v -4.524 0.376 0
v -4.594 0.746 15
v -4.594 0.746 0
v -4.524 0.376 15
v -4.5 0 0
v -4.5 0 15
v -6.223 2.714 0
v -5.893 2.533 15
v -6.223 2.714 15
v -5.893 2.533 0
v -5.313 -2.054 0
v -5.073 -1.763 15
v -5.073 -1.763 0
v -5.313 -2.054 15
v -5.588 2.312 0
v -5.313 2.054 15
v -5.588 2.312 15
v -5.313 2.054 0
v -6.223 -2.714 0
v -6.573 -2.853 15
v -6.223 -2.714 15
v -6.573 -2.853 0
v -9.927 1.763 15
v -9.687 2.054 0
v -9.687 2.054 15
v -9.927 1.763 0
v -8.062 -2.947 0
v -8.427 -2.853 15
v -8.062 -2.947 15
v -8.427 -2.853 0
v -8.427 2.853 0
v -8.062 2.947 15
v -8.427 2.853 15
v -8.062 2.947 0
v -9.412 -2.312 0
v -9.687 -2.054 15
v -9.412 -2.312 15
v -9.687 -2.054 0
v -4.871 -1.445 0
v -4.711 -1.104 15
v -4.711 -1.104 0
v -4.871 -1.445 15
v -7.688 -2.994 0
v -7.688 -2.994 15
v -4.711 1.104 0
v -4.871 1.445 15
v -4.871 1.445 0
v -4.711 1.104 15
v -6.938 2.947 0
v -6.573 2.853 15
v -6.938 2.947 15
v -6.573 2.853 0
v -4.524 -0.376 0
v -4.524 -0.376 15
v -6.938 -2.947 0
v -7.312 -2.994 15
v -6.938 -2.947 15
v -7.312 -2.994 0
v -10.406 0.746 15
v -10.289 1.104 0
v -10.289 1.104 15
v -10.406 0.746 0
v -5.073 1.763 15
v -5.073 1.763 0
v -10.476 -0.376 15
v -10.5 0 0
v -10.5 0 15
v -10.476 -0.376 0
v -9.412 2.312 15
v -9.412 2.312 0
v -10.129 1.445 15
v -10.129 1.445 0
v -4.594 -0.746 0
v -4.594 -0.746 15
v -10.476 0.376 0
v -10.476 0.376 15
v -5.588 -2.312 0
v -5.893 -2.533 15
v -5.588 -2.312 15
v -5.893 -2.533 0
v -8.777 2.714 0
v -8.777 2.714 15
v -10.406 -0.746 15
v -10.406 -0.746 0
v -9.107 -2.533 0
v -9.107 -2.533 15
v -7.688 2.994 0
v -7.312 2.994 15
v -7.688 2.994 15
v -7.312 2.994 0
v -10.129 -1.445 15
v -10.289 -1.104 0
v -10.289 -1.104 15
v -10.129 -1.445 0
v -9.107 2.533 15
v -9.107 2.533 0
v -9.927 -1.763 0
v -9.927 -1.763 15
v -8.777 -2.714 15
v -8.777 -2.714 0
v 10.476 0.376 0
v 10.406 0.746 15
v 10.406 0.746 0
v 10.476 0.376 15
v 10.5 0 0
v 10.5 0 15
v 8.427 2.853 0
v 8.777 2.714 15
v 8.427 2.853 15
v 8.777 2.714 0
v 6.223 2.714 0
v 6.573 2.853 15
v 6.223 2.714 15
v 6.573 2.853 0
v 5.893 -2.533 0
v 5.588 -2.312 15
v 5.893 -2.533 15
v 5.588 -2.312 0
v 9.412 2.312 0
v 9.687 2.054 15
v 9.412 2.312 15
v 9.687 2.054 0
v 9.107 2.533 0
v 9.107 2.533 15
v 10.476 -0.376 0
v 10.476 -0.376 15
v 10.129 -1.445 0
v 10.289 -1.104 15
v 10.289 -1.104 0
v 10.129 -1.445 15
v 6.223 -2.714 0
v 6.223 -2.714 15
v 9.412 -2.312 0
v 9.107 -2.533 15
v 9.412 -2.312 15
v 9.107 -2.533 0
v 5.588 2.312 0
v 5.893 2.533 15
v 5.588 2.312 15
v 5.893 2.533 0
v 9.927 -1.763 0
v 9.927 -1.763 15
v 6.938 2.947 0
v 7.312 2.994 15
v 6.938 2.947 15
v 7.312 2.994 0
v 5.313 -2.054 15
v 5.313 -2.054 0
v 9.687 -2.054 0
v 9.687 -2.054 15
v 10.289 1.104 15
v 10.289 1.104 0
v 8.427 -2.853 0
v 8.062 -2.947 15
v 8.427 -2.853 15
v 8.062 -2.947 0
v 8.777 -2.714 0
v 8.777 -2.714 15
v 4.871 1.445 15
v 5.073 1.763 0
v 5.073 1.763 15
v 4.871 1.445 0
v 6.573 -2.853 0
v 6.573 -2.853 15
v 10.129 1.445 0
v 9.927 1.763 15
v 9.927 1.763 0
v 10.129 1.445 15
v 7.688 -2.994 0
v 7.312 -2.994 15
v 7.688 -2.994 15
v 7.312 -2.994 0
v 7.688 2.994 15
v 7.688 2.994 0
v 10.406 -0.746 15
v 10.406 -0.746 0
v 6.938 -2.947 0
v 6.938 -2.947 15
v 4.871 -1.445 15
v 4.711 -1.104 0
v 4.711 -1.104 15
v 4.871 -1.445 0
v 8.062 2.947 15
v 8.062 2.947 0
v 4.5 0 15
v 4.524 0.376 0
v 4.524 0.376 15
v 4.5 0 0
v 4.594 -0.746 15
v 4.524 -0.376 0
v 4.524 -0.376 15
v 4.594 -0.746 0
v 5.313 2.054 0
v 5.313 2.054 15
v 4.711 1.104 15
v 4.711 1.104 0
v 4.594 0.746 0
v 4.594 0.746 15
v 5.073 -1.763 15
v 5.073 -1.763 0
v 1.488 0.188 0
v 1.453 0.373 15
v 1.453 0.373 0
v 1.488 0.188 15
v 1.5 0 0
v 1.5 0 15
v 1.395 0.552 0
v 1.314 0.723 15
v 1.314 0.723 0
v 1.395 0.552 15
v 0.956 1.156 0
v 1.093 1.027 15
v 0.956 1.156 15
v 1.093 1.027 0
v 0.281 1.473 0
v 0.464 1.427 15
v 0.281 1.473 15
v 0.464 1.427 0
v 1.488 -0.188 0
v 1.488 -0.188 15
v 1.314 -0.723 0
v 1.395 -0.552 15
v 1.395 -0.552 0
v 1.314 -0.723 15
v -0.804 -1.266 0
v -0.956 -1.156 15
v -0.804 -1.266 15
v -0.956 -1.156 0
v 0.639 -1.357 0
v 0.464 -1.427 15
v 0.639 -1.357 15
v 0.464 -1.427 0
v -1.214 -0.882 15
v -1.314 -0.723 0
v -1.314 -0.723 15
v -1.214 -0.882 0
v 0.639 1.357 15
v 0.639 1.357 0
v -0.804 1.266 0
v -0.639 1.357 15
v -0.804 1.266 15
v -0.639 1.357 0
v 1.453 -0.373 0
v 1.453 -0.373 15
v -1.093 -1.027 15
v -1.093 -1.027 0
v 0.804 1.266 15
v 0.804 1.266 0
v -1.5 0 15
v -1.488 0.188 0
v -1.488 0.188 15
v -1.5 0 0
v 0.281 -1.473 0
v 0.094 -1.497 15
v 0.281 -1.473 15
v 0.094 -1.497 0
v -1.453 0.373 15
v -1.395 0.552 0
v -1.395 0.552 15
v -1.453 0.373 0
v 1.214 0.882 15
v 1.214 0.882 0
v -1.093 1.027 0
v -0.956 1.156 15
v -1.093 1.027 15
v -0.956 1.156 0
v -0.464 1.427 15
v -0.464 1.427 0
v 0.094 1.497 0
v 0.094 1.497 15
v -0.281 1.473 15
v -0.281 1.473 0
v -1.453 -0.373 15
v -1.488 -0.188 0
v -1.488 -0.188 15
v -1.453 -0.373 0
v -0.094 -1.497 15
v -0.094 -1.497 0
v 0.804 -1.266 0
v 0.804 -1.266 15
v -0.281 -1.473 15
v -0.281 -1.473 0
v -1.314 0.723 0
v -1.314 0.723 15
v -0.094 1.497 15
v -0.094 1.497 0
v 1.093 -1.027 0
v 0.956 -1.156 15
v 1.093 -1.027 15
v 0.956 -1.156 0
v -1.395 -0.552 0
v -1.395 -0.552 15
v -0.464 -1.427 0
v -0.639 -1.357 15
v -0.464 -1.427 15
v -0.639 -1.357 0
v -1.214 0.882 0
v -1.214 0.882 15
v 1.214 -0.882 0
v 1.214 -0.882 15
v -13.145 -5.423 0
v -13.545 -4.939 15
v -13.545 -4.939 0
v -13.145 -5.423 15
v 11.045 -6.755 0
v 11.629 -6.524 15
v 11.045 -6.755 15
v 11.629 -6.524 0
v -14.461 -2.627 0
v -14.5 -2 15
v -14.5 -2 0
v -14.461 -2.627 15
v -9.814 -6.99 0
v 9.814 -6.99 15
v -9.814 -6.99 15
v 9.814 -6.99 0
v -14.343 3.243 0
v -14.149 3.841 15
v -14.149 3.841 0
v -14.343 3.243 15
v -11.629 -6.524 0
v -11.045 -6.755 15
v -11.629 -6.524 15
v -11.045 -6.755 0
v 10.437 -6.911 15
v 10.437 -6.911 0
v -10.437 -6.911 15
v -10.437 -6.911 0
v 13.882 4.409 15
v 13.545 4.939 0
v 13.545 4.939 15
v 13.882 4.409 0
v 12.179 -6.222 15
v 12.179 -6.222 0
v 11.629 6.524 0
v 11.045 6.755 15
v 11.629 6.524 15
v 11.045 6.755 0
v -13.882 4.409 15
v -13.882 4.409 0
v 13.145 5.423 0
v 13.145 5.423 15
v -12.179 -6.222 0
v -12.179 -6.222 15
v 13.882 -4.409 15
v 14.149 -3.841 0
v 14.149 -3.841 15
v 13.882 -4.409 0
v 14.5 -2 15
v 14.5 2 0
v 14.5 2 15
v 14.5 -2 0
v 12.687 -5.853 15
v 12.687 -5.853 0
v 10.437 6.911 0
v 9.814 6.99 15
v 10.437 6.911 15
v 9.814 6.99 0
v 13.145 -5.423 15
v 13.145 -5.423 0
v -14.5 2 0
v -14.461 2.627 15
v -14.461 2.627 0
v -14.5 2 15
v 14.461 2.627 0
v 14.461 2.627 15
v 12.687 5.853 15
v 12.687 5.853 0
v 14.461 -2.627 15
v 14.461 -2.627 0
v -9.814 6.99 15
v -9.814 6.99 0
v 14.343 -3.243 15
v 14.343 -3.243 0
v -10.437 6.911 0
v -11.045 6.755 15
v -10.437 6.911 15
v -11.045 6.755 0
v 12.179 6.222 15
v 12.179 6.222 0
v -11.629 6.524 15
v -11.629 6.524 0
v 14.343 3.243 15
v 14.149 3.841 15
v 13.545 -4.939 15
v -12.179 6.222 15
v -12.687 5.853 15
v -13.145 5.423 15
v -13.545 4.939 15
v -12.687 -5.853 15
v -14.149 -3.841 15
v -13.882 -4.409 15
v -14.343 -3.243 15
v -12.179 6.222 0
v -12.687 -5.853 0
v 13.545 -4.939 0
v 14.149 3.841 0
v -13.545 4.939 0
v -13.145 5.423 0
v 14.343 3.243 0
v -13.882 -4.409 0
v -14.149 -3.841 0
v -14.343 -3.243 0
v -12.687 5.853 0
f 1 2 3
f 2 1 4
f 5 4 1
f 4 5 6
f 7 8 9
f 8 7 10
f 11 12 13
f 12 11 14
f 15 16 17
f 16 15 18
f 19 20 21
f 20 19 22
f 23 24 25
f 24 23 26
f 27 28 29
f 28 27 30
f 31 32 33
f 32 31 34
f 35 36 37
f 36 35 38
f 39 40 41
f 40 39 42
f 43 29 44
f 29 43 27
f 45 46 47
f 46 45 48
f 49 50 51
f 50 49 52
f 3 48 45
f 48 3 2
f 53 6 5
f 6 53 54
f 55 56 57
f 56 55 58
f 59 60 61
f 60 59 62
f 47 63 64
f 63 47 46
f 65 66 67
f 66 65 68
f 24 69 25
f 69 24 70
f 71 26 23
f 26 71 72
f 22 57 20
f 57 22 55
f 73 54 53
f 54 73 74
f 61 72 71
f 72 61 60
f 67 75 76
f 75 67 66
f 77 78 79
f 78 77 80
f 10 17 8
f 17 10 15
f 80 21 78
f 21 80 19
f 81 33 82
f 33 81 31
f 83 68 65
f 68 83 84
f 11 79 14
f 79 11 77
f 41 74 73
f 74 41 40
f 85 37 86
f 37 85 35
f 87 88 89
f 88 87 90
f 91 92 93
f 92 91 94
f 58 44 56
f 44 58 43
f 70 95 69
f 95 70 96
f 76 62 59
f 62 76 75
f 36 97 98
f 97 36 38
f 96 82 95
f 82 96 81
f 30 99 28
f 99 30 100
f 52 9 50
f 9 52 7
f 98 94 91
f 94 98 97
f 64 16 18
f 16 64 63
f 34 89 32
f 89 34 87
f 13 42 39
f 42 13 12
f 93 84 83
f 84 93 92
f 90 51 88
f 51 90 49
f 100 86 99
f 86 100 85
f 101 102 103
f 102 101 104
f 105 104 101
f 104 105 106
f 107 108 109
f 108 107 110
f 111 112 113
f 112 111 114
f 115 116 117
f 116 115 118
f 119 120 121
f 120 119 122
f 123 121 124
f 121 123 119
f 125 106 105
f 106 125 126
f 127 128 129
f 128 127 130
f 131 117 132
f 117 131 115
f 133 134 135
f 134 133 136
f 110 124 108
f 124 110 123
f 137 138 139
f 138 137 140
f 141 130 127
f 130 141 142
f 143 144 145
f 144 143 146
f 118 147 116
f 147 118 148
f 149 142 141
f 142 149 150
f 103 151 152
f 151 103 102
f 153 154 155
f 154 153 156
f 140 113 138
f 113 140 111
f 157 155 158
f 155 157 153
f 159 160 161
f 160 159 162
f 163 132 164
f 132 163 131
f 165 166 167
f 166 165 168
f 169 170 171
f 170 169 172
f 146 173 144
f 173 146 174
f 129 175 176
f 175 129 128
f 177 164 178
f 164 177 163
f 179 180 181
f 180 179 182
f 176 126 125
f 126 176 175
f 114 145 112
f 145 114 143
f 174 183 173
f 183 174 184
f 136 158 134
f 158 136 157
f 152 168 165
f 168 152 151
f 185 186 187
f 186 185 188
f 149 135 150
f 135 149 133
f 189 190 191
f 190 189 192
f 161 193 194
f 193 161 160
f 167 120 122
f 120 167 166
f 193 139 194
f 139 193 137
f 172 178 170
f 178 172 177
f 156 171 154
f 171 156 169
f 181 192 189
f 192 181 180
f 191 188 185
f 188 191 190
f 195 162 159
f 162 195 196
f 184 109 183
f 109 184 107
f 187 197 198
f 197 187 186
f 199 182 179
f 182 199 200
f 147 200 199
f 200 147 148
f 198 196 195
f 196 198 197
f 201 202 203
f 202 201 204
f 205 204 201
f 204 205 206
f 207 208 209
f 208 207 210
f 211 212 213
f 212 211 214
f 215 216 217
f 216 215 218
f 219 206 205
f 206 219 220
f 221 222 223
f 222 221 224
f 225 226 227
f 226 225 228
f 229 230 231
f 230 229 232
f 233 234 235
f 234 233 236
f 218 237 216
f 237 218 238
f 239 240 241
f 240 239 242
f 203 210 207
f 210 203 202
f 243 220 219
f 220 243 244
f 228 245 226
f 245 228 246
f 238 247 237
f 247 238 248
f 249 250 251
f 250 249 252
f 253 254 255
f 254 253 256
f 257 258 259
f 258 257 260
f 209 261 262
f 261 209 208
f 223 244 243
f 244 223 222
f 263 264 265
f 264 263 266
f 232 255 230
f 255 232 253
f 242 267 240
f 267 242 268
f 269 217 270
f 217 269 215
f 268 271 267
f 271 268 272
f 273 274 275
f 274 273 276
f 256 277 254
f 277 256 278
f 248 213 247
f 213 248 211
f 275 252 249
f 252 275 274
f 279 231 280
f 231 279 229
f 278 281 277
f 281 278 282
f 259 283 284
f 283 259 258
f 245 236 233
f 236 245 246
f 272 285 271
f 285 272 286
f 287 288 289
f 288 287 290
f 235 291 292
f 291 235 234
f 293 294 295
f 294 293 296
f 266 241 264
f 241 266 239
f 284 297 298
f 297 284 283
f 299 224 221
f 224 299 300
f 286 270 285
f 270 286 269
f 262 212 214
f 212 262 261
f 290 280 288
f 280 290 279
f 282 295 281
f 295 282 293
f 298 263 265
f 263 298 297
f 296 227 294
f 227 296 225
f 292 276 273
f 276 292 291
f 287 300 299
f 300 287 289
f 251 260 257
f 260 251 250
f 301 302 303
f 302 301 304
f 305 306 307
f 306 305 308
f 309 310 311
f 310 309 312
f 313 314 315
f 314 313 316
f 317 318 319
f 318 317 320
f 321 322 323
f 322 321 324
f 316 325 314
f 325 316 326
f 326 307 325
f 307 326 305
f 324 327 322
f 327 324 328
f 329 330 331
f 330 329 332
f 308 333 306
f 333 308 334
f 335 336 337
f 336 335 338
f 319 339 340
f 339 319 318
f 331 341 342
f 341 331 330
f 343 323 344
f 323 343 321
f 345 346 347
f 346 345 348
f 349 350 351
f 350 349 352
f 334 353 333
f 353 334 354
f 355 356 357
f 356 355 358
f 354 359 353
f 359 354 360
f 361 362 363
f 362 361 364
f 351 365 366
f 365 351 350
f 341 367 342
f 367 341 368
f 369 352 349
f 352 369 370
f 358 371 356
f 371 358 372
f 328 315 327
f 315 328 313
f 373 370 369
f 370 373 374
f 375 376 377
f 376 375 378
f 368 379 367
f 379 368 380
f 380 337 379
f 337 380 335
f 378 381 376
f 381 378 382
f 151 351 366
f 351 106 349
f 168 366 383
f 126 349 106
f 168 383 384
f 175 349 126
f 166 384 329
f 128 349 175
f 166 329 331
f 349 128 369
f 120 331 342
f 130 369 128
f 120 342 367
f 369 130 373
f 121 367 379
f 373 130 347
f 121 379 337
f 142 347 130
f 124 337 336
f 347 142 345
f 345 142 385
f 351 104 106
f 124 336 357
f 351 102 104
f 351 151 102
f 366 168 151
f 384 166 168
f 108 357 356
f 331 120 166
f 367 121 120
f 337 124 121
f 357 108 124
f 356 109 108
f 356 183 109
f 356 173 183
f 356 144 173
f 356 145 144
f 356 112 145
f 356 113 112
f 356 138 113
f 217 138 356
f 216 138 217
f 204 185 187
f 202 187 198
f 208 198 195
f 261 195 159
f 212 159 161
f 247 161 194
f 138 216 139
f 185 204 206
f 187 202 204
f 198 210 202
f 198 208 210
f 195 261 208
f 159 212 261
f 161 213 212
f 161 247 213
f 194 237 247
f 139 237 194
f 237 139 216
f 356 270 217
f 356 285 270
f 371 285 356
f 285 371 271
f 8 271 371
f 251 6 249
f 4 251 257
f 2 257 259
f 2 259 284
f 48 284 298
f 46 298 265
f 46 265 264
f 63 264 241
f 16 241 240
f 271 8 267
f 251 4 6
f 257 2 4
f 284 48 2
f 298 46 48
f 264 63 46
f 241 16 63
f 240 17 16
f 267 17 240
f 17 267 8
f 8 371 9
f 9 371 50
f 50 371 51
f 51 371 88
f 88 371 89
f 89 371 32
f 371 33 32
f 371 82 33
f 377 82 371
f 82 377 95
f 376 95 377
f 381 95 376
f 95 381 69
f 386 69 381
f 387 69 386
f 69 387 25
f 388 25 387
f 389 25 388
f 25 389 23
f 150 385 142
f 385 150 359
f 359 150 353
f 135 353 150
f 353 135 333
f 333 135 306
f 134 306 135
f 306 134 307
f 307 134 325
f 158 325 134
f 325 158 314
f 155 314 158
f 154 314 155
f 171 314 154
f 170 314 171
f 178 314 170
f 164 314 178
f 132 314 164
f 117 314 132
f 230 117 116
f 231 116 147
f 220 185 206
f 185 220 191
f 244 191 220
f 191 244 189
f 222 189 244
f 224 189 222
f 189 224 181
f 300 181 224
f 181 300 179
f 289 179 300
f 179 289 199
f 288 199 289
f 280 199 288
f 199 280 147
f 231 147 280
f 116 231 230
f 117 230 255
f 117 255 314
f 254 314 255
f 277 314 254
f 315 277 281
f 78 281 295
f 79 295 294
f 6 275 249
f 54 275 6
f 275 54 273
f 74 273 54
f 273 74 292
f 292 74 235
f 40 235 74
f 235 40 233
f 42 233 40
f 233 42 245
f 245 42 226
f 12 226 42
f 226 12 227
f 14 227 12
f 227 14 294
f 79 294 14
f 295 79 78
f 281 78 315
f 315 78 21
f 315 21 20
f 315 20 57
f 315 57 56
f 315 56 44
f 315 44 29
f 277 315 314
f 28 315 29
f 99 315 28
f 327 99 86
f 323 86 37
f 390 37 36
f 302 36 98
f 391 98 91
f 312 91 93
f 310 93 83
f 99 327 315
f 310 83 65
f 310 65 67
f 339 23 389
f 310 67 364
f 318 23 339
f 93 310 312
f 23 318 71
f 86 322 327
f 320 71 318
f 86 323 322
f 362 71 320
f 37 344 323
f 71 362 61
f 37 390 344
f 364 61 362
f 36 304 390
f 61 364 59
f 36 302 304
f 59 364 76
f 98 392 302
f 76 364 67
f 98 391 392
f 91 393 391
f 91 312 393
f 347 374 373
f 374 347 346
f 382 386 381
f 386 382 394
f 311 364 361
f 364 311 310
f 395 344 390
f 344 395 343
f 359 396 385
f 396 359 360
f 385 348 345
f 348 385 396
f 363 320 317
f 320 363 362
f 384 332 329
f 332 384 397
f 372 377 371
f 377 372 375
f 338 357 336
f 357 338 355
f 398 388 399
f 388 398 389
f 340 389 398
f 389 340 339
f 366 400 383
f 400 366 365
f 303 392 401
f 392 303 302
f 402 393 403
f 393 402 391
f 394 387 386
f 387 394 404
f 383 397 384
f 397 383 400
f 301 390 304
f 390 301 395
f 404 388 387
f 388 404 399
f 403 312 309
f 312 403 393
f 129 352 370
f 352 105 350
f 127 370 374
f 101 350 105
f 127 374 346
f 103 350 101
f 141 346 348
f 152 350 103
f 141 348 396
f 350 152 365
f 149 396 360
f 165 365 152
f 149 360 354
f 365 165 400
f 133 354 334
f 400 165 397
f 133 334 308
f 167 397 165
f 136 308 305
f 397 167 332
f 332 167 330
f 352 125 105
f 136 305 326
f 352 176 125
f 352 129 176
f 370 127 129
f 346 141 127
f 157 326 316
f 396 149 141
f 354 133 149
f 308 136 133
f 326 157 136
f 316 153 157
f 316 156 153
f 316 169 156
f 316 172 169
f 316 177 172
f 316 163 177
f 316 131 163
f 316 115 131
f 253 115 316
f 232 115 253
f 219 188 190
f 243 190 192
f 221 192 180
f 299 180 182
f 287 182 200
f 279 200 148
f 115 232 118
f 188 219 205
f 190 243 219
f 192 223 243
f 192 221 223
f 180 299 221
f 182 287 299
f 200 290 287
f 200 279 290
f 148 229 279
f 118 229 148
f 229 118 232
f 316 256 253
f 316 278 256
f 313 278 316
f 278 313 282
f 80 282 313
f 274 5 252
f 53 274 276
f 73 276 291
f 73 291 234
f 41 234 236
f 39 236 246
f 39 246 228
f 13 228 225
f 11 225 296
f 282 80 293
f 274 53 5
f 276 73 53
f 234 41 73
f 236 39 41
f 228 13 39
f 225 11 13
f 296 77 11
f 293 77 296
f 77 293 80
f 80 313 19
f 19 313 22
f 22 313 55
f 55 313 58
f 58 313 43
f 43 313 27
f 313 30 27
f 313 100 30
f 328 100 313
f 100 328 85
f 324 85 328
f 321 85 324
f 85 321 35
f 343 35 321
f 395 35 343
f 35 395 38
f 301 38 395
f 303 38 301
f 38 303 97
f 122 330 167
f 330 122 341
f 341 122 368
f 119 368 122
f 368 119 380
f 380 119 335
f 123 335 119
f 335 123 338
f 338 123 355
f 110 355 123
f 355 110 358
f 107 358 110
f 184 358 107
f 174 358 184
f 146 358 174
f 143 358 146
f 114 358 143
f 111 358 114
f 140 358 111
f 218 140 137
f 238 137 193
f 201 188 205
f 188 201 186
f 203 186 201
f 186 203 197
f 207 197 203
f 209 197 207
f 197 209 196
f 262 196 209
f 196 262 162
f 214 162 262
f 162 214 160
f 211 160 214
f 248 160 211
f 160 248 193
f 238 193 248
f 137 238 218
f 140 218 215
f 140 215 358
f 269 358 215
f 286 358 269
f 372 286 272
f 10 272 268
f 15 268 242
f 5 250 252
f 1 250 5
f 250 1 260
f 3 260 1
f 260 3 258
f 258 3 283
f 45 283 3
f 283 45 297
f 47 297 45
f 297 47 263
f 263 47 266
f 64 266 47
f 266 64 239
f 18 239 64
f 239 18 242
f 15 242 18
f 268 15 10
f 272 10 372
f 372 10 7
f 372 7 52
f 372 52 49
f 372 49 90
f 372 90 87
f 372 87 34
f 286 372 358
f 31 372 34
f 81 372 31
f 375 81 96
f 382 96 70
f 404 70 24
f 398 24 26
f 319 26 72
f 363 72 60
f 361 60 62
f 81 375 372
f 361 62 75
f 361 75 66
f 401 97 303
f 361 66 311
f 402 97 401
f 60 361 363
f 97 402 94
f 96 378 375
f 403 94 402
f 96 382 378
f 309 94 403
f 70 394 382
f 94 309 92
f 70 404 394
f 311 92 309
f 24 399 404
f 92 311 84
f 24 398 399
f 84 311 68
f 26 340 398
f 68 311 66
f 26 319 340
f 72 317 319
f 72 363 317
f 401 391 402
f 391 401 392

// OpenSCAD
$fn = 50;


difference() {
	union() {
		hull() {
			translate(v = [-9.5000000000, 2.0000000000, 0]) {
				cylinder(h = 15, r = 5);
			}
			translate(v = [9.5000000000, 2.0000000000, 0]) {
				cylinder(h = 15, r = 5);
			}
			translate(v = [-9.5000000000, -2.0000000000, 0]) {
				cylinder(h = 15, r = 5);
			}
			translate(v = [9.5000000000, -2.0000000000, 0]) {
				cylinder(h = 15, r = 5);
			}
		}
	}
	union() {
		translate(v = [-7.5000000000, 0.0000000000, 0]) {
			translate(v = [0, 0, -100]) {
				cylinder(h = 200, r = 3.0000000000);
			}
		}
		translate(v = [7.5000000000, 0.0000000000, 0]) {
			translate(v = [0, 0, -100]) {
				cylinder(h = 200, r = 3.0000000000);
			}
		}
		translate(v = [-7.5000000000, 0.0000000000, 0]) {
			translate(v = [0, 0, -100]) {
				cylinder(h = 200, r = 1.5000000000);
			}
		}
		translate(v = [0, 0, -100]) {
			cylinder(h = 200, r = 1.5000000000);
		}
		translate(v = [7.5000000000, 0.0000000000, 0]) {
			translate(v = [0, 0, -100]) {
				cylinder(h = 200, r = 1.5000000000);
			}
		}
	}
}
